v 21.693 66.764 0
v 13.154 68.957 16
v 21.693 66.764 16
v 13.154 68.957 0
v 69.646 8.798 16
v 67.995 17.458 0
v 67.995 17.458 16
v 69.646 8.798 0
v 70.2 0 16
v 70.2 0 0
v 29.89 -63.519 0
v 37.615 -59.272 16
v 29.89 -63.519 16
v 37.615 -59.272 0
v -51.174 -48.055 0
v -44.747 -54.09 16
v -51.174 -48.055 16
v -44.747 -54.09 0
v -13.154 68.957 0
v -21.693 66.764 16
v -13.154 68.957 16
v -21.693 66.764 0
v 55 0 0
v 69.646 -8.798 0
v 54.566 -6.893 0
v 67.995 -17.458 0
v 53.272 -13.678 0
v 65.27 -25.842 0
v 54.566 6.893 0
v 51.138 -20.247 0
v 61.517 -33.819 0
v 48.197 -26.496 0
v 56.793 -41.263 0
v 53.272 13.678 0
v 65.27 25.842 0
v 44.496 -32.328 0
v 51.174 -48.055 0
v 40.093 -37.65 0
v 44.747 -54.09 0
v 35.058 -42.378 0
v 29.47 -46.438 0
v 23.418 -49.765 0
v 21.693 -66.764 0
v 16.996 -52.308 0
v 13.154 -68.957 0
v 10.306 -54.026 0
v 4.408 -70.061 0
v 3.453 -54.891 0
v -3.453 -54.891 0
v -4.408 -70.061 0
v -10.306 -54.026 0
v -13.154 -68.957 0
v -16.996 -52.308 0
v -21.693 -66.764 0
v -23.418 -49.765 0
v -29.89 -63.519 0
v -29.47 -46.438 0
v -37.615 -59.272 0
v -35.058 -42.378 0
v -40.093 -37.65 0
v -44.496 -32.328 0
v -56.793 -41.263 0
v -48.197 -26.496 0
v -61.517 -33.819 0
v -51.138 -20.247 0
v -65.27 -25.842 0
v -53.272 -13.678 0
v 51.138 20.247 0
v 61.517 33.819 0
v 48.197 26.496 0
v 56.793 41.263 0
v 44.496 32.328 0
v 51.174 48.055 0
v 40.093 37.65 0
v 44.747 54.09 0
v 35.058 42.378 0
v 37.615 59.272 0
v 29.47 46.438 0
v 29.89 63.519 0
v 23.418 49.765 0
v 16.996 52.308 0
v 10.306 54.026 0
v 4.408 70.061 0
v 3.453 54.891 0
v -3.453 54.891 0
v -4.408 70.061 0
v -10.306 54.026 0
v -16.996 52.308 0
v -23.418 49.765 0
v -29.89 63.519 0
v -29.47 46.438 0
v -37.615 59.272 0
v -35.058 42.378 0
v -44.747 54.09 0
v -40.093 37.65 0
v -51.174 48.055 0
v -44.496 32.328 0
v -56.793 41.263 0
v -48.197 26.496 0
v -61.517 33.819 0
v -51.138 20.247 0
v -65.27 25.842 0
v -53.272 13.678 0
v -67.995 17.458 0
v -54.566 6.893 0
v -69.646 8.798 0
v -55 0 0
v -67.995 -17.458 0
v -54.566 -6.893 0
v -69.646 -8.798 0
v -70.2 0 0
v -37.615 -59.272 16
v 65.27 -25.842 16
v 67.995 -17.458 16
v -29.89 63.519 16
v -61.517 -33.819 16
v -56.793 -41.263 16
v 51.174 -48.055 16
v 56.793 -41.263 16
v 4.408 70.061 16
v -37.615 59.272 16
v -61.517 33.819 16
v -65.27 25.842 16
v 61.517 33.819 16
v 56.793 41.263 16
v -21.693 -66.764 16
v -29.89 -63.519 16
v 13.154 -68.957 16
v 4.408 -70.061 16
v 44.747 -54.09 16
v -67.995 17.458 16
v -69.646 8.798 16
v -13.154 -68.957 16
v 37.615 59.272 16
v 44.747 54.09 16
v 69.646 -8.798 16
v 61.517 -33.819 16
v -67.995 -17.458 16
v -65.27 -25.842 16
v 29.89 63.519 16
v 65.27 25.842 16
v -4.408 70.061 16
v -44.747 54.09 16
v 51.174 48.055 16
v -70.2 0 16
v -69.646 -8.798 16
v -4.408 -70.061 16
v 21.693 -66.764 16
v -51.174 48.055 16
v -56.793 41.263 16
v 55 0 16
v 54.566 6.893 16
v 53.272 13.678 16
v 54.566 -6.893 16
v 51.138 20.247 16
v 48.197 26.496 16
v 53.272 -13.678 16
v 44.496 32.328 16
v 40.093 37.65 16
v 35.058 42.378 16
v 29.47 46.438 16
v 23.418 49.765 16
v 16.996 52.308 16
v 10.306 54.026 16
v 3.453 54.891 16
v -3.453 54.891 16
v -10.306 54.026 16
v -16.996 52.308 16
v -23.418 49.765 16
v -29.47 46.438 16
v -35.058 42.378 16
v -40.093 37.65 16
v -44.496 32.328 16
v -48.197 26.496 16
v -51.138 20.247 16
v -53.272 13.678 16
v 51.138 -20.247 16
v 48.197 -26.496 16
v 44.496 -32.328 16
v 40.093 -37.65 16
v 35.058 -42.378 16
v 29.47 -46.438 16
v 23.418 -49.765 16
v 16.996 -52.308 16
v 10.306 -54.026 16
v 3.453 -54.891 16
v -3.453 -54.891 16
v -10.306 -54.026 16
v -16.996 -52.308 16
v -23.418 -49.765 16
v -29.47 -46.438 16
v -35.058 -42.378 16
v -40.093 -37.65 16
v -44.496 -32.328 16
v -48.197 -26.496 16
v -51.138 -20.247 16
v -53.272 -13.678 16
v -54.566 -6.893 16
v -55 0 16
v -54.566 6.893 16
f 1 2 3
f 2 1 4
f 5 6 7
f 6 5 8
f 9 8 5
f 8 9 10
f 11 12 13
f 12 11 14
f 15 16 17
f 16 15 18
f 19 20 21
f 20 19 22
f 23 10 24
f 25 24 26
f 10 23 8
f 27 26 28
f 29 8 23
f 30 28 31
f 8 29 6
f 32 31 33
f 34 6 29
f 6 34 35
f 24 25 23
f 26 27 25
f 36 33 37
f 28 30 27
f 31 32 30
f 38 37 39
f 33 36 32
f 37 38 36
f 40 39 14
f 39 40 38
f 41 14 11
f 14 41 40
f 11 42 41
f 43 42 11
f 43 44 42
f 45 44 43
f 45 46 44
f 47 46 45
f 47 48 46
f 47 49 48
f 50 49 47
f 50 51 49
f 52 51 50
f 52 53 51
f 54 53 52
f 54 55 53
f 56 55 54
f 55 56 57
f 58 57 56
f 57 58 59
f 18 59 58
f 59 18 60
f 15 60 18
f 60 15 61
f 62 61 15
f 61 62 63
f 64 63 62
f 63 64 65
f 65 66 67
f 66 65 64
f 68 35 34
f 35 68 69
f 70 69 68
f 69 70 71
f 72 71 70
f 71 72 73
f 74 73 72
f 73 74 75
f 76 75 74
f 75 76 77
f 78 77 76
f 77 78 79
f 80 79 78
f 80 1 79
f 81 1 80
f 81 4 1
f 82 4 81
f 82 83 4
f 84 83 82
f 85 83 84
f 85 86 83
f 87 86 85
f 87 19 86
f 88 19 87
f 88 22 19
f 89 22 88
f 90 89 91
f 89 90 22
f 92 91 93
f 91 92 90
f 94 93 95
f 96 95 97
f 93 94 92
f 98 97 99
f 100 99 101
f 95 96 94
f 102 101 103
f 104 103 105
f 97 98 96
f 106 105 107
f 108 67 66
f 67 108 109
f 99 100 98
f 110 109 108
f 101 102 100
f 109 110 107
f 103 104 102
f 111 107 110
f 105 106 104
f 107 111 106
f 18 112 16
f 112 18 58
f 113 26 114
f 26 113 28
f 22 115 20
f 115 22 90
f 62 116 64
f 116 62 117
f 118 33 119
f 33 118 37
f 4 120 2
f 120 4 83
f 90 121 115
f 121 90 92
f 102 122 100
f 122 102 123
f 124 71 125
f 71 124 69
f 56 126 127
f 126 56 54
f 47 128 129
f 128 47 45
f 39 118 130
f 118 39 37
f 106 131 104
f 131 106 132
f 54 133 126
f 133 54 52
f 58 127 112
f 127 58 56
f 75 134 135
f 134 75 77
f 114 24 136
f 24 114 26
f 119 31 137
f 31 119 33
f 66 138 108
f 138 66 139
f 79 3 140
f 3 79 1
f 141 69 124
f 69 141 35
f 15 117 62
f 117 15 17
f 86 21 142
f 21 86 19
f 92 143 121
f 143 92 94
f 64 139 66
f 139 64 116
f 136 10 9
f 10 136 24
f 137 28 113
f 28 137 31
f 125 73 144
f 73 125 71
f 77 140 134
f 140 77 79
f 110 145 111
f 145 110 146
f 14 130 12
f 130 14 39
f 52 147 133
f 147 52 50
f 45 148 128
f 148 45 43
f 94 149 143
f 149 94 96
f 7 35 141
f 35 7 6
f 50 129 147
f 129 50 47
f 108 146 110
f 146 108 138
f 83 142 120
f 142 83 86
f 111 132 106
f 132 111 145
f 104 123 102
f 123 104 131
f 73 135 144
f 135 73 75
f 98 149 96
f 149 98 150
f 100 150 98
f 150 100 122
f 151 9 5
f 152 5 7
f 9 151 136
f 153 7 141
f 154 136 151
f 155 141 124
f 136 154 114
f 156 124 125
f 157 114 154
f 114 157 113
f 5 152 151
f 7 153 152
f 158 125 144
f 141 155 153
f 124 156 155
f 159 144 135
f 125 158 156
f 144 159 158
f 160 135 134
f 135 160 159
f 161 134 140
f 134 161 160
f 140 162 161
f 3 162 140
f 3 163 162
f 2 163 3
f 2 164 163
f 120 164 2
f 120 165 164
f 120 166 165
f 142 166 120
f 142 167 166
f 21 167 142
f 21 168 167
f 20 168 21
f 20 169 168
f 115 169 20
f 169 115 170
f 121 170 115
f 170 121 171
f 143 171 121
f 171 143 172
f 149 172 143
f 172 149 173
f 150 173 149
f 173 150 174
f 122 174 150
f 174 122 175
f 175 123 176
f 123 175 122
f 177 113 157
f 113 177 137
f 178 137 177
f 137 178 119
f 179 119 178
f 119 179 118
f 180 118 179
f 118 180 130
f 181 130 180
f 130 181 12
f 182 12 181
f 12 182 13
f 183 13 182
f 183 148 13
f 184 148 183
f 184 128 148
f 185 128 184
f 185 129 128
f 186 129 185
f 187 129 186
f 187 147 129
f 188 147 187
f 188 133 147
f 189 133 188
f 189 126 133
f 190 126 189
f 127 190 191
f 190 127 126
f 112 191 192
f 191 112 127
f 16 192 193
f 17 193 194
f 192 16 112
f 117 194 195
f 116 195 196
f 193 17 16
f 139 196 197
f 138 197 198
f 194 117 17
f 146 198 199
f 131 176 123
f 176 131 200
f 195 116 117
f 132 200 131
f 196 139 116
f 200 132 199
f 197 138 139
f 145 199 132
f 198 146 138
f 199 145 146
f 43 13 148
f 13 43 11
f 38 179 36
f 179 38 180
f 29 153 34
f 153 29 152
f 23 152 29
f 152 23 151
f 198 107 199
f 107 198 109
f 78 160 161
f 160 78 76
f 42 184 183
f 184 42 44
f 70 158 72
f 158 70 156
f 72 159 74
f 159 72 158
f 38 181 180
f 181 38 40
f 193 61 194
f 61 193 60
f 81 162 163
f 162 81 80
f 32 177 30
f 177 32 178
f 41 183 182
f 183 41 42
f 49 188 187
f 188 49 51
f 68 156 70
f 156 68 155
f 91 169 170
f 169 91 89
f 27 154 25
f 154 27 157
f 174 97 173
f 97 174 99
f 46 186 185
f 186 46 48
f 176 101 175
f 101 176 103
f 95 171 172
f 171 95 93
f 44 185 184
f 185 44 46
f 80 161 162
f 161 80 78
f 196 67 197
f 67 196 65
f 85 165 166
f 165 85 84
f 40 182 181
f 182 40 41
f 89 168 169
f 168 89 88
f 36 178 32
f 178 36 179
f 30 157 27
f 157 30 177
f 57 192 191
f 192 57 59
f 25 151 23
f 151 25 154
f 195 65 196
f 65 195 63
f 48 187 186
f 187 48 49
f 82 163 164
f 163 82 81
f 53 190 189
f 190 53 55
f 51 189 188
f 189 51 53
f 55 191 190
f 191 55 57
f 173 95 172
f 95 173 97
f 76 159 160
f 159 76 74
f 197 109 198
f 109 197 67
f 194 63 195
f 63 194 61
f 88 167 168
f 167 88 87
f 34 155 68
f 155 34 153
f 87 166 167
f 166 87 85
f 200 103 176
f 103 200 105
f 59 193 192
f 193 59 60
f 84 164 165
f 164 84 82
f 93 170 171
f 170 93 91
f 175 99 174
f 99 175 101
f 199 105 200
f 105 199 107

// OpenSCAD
$fn = 50;


difference() {
	union() {
		cylinder(h = 16, r = 70.2000000000);
	}
	union() {
		cylinder(h = 16, r = 55.0000000000);
	}
}
